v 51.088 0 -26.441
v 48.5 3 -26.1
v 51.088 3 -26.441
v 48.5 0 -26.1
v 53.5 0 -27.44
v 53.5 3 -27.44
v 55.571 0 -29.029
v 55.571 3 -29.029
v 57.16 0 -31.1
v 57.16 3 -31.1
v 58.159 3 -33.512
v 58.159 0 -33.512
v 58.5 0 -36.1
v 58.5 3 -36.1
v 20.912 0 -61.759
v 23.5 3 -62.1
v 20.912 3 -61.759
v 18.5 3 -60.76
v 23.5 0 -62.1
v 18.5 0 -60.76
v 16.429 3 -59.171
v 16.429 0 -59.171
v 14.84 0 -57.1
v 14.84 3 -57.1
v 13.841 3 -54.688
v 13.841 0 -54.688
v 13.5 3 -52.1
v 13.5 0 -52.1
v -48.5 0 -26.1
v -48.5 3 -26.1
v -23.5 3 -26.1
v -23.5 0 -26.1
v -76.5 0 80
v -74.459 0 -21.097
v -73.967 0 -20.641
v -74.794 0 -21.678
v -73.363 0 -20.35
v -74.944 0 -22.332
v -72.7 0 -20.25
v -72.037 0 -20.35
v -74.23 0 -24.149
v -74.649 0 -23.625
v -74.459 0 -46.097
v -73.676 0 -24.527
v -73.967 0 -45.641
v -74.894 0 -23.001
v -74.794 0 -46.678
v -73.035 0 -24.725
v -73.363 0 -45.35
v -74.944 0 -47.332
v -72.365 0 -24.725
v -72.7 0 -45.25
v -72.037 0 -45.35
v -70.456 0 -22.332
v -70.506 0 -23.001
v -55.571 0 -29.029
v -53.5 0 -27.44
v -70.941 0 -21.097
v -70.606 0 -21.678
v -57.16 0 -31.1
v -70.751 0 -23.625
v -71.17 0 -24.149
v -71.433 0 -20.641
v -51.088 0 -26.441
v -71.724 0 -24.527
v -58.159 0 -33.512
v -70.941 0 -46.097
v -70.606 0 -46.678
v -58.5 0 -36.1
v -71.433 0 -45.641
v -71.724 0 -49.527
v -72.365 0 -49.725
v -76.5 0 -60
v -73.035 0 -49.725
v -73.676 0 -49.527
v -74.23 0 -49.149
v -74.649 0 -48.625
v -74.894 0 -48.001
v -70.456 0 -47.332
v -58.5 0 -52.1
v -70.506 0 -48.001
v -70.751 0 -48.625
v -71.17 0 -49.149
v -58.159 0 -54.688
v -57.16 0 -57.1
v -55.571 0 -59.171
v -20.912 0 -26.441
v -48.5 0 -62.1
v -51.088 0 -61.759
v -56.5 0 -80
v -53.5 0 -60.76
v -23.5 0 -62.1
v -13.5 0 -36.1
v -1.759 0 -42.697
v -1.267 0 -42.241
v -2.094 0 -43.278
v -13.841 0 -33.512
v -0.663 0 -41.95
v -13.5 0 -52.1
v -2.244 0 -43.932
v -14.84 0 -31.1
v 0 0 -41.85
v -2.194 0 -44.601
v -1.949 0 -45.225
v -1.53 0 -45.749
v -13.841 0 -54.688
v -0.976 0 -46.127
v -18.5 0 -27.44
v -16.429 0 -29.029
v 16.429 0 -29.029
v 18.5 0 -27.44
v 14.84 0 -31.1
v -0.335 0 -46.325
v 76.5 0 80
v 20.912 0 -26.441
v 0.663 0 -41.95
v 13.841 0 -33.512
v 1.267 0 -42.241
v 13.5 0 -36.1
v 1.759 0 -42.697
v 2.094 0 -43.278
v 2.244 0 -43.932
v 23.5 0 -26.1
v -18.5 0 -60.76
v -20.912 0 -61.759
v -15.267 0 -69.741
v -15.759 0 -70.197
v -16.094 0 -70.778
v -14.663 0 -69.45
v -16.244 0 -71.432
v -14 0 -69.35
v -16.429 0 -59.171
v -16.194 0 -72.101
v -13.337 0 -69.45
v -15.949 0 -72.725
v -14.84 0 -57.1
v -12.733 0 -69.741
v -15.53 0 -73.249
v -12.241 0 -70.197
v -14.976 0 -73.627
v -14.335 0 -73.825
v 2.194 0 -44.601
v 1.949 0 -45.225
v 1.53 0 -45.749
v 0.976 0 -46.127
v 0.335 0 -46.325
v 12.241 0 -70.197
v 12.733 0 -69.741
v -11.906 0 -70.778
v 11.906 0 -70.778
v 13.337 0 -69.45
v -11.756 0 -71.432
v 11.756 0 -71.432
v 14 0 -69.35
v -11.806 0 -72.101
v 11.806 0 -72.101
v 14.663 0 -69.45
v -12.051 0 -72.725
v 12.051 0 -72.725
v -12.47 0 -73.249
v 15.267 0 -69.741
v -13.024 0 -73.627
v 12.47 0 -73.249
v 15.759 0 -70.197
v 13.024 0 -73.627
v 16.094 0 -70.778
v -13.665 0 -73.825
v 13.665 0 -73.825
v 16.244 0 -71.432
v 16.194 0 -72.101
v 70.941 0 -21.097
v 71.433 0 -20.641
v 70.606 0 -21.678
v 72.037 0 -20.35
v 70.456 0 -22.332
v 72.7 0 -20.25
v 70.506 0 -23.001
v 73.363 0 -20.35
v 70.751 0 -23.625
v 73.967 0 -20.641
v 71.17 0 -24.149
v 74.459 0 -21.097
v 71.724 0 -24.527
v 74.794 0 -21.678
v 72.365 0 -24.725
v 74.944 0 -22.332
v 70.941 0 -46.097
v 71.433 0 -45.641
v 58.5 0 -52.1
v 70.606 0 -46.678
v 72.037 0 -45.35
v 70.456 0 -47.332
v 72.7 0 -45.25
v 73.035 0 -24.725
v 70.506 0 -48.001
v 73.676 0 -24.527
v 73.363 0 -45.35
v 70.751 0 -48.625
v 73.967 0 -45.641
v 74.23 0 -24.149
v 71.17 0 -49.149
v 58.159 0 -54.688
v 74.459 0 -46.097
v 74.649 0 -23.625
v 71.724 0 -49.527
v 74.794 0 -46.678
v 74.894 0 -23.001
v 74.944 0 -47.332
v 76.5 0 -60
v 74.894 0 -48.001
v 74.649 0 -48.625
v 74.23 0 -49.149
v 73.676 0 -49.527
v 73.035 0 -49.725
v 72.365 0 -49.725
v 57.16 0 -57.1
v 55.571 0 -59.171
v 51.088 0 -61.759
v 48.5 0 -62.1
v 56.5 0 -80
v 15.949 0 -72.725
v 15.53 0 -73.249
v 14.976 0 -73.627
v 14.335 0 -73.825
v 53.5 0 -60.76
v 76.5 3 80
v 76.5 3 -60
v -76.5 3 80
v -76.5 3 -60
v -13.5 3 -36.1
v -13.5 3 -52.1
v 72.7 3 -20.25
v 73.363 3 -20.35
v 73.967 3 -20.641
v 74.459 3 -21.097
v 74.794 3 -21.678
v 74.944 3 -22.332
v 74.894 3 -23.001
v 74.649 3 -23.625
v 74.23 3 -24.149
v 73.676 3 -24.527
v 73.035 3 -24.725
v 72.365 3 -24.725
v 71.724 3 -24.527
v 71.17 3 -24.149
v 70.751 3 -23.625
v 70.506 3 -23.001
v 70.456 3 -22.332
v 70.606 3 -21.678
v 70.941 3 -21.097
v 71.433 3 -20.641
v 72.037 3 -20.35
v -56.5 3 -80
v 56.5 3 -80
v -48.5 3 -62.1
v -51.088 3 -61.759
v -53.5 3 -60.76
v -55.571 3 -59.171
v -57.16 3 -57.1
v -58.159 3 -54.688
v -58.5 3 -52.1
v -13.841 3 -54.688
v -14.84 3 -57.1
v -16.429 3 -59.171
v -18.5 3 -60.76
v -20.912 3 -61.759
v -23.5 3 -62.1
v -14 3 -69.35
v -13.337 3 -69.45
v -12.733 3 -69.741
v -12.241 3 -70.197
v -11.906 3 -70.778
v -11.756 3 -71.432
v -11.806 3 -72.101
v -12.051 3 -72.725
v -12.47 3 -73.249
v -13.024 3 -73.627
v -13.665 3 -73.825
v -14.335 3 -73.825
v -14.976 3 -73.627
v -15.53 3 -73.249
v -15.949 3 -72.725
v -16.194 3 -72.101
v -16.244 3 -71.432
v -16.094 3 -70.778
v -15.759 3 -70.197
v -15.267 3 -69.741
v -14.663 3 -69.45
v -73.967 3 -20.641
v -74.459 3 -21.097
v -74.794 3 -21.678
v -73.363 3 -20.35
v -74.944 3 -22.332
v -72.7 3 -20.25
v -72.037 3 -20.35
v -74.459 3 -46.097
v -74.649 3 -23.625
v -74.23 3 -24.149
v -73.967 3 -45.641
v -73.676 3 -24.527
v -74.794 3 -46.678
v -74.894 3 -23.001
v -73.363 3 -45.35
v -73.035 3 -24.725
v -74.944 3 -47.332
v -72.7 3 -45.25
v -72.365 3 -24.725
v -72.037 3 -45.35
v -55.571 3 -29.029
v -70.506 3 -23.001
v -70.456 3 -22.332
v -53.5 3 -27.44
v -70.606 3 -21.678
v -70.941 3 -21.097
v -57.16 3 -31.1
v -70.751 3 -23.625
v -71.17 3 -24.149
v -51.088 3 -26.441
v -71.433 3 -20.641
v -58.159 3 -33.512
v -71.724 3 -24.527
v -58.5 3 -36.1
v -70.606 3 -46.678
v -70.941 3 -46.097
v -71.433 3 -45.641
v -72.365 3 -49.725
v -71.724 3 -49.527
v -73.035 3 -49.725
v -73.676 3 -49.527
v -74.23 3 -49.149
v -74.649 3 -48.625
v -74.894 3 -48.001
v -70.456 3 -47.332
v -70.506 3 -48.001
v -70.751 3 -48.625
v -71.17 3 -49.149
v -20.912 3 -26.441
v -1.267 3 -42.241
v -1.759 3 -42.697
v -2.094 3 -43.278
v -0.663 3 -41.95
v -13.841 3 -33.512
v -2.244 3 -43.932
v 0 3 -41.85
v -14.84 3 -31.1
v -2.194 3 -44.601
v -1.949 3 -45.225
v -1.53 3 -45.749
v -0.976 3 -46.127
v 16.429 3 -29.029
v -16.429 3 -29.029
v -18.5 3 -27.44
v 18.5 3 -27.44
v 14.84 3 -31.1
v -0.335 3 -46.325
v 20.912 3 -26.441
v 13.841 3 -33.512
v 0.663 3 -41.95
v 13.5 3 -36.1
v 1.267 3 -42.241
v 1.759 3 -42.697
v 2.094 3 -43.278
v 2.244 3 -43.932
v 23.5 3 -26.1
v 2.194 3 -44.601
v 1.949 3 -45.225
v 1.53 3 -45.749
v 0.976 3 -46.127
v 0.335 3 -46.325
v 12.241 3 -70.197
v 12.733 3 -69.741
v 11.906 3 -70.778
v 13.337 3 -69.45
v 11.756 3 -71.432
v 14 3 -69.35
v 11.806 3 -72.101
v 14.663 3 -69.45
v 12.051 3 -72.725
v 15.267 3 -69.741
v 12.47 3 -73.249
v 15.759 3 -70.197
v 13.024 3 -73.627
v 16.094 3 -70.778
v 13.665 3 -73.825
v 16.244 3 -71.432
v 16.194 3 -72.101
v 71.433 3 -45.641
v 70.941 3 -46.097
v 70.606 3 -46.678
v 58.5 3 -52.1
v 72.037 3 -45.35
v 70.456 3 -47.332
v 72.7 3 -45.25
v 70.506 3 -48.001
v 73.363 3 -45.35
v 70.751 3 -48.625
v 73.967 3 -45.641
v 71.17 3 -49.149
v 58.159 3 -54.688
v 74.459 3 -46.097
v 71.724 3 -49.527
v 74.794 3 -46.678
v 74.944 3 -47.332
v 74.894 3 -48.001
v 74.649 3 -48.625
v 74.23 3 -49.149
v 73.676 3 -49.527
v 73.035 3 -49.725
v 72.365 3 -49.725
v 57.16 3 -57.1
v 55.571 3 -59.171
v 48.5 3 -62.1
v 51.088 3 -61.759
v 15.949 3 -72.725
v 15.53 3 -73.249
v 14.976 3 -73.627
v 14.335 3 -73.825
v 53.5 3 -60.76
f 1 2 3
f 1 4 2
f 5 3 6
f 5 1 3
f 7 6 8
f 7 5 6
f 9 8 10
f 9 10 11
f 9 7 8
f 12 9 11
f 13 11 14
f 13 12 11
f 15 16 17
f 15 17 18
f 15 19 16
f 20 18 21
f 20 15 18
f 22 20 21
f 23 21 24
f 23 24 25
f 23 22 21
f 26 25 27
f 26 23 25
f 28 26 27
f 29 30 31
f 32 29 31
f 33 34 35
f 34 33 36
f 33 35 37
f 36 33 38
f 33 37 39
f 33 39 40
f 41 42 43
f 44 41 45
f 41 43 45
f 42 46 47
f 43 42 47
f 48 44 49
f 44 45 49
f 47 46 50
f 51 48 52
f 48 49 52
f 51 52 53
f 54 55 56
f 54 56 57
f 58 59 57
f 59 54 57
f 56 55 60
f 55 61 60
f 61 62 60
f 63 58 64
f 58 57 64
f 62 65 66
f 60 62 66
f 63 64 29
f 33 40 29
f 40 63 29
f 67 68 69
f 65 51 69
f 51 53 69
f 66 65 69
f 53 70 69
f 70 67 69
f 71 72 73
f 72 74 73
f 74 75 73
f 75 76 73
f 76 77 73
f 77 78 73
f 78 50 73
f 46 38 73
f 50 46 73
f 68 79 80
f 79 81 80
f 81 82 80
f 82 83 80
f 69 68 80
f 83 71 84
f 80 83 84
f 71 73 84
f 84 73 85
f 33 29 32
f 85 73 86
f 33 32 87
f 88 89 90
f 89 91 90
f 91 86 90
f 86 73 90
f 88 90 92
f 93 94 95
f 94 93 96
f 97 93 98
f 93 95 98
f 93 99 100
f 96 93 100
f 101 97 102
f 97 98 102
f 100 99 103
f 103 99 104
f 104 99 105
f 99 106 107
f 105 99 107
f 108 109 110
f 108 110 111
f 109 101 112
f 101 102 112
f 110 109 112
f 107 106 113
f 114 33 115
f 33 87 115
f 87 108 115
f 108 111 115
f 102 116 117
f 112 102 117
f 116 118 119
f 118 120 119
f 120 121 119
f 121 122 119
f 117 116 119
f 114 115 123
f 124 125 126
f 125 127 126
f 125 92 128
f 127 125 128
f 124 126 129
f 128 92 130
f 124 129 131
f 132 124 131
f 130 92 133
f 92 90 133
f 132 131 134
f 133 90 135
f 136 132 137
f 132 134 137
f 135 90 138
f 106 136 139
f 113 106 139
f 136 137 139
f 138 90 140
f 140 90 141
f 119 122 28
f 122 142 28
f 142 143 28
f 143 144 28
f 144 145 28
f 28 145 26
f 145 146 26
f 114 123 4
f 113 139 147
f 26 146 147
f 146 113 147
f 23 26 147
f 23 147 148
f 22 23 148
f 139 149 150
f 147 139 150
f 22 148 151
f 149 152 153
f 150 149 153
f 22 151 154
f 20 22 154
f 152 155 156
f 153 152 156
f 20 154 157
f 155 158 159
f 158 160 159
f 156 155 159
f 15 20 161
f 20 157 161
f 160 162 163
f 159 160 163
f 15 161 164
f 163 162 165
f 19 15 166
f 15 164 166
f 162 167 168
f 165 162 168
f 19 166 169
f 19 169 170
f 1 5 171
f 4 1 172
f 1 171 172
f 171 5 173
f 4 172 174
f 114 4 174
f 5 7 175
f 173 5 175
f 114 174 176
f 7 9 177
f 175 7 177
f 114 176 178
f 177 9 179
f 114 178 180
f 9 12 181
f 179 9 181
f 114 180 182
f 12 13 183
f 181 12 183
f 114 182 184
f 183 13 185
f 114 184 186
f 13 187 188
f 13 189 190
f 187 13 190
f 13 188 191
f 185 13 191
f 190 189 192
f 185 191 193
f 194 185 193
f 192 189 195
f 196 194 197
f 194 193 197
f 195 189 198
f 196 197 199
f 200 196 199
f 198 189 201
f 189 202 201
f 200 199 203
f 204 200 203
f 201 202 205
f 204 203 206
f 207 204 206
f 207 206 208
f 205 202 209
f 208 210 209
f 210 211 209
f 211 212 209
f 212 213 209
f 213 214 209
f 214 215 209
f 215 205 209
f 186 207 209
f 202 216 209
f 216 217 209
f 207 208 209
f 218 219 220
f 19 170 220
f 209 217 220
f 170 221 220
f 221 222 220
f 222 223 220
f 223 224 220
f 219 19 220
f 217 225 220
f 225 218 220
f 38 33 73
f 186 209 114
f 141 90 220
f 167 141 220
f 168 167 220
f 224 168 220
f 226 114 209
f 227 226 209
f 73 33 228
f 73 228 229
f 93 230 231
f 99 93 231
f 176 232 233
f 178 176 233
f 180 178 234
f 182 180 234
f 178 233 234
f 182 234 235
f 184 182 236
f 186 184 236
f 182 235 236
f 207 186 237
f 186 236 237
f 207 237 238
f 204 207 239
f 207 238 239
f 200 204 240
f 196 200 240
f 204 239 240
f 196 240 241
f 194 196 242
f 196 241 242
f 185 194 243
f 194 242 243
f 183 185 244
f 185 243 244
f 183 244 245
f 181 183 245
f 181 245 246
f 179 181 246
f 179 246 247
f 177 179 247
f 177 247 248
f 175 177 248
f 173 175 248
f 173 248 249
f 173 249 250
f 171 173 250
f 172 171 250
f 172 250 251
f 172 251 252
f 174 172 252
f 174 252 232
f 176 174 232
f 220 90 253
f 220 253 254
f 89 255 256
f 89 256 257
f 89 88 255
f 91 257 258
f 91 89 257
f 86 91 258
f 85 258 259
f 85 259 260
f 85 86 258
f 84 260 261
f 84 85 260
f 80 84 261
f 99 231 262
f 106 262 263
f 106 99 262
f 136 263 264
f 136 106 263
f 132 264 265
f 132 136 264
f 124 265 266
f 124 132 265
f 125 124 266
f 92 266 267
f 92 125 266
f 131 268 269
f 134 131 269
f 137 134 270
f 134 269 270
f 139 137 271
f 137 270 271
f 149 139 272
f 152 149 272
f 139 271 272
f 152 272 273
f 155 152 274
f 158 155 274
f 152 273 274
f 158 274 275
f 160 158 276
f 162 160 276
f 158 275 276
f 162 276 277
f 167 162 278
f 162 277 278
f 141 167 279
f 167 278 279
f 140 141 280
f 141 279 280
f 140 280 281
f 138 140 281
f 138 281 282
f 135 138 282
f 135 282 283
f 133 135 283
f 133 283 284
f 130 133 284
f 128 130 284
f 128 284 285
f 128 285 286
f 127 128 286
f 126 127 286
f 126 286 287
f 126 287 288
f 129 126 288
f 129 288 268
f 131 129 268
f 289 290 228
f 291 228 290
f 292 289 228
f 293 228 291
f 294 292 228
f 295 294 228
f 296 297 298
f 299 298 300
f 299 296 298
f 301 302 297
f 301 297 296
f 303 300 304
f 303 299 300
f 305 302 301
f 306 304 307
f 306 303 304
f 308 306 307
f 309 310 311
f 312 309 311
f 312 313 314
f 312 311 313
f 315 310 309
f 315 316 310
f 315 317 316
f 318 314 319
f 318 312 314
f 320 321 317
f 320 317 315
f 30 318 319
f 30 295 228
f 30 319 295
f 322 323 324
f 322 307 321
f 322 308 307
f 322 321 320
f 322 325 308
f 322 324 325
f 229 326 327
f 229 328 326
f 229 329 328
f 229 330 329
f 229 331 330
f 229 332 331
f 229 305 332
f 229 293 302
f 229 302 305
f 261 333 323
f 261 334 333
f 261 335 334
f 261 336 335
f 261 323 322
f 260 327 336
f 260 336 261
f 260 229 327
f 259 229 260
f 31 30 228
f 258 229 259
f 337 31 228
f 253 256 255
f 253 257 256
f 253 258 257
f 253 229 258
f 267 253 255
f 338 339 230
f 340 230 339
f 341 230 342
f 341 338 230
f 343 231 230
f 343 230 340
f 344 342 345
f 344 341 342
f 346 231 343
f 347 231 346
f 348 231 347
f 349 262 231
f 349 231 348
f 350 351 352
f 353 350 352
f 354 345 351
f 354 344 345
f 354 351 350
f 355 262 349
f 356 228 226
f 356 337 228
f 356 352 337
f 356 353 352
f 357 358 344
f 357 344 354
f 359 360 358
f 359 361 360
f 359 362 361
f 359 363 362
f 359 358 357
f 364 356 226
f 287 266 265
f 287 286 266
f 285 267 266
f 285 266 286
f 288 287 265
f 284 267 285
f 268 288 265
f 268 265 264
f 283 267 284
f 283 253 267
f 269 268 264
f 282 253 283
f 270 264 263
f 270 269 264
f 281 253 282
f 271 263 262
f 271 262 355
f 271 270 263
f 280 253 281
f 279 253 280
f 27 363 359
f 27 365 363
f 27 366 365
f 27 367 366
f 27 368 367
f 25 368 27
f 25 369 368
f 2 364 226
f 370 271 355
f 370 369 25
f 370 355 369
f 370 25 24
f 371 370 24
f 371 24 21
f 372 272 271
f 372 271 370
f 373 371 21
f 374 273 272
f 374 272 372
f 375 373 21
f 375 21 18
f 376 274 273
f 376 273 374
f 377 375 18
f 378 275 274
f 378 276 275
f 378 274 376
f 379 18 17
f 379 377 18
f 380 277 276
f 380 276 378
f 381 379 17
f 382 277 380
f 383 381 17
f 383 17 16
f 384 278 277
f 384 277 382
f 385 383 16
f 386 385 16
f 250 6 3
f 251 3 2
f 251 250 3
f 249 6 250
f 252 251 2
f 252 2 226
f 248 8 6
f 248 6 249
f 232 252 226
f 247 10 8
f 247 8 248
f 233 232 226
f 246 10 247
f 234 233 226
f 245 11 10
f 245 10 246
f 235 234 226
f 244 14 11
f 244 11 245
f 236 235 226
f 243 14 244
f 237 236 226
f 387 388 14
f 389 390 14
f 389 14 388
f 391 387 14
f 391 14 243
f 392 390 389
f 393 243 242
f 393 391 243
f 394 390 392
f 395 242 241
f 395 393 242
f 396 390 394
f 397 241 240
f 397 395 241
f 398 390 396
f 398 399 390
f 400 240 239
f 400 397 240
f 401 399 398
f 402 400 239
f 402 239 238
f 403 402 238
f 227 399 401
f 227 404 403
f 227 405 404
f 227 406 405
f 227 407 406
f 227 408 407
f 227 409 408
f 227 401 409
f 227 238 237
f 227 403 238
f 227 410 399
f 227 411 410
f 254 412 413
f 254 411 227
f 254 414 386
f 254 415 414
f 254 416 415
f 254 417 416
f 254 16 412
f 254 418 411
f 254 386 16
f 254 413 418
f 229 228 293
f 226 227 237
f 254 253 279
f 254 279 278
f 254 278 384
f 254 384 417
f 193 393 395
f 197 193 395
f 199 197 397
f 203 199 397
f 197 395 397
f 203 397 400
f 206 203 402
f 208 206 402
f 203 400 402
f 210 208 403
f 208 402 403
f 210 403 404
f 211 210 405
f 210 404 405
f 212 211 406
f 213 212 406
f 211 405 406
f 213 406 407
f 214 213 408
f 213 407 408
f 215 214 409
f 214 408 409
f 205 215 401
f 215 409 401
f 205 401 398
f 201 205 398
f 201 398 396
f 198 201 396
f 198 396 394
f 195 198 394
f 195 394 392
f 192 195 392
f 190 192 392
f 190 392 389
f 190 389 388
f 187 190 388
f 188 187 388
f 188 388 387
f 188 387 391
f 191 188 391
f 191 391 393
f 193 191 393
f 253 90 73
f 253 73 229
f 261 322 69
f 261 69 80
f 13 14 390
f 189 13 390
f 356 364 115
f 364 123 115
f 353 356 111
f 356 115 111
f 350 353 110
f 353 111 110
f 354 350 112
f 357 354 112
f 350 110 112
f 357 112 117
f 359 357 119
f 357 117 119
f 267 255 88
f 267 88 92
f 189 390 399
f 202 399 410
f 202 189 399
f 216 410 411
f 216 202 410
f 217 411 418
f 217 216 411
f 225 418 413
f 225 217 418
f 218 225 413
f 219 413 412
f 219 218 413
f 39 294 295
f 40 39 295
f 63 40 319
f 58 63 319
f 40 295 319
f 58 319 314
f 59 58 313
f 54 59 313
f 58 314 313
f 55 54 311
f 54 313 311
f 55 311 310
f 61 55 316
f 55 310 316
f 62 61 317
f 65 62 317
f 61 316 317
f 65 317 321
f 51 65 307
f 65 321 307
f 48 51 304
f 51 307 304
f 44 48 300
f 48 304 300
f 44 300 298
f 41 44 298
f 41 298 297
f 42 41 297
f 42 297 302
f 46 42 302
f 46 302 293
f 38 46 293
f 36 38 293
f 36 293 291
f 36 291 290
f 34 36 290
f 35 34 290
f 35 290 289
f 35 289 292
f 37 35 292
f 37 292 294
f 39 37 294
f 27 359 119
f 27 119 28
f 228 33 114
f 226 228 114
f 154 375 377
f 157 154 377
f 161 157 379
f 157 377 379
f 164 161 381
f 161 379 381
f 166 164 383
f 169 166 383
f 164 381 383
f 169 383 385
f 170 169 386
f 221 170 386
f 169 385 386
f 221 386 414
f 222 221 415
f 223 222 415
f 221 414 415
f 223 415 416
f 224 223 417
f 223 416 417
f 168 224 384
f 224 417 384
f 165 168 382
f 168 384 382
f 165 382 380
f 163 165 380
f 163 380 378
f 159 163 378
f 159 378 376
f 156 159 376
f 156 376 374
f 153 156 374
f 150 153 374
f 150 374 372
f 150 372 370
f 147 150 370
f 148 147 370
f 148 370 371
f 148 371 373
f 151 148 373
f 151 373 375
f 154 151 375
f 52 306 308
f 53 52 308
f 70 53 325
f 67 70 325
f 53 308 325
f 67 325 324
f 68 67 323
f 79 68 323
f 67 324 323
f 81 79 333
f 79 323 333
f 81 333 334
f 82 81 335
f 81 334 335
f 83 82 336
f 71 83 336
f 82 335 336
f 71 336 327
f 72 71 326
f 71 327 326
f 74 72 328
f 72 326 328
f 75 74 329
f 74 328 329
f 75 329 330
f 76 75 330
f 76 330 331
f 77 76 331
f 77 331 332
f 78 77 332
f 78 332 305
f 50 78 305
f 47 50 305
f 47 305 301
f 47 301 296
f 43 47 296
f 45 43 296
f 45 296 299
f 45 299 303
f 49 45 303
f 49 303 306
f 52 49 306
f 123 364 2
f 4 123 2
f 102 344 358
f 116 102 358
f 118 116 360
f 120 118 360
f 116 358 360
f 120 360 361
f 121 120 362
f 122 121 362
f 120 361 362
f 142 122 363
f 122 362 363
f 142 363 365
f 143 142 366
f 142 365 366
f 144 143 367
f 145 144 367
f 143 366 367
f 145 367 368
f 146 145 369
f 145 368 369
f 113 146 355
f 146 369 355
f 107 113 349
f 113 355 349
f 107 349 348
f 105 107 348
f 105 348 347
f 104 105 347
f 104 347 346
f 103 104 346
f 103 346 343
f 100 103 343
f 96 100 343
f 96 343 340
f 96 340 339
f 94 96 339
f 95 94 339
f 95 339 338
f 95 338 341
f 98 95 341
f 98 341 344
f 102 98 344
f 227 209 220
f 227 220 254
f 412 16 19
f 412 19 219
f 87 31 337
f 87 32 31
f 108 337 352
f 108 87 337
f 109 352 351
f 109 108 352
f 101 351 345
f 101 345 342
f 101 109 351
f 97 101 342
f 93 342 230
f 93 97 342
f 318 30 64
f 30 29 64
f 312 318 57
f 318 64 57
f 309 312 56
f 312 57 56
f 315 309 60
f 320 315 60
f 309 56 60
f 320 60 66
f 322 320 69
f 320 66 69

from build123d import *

# Parameters (mm, degrees)
SKETCH_1_W          = 153
SKETCH_1_H          = 160
EXTRUDE_1_DEPTH     = 3
SKETCH_2_R          = 2.25
CUT_EXTRUDE_1_DEPTH = 5
SKETCH_3_W          = 45
SKETCH_3_H          = 36
CUT_EXTRUDE_2_DEPTH = 5
FILLET_1_R          = 10
CHAMFER_1_SIZE      = 20


with BuildPart() as part:
    # 草图1 → 凸台-拉伸1 (new body)
    with BuildSketch(Plane(origin=(0, 0, 0), x_dir=(1, 0, 0), z_dir=(0, 1, 0))):
        Rectangle(SKETCH_1_W, SKETCH_1_H)
    extrude(amount=EXTRUDE_1_DEPTH)

    # 草图2 → 切除-拉伸1 (cut)
    with BuildSketch(Plane(origin=(0, 3, 0), x_dir=(1, 0, 0), z_dir=(0, 1, 0))):
        with Locations(Location((72.7, 47.5, 0), (0, 0, 270))):
            Circle(SKETCH_2_R)
        with Locations(Location((-72.7, 47.5, 0), (0, 0, 270))):
            Circle(SKETCH_2_R)
        with Locations(Location((72.7, 22.5, 0), (0, 0, 270))):
            Circle(SKETCH_2_R)
        with Locations(Location((-72.7, 22.5, 0), (0, 0, 270))):
            Circle(SKETCH_2_R)
        with Locations(Location((-14, 71.6, 0), (0, 0, 270))):
            Circle(SKETCH_2_R)
        with Locations(Location((14, 71.6, 0), (0, 0, 270))):
            Circle(SKETCH_2_R)
        with Locations(Location((0, 44.1, 0), (0, 0, 270))):
            Circle(SKETCH_2_R)
    extrude(amount=-CUT_EXTRUDE_1_DEPTH, mode=Mode.SUBTRACT)

    # 草图3 → 切除-拉伸2 (cut)
    with BuildSketch(Plane(origin=(0, 3, 0), x_dir=(1, 0, 0), z_dir=(0, 1, 0))):
        with Locations((36, 44.1)):
            Rectangle(SKETCH_3_W, SKETCH_3_H)
        with Locations((-36, 44.1)):
            Rectangle(SKETCH_3_W, SKETCH_3_H)
    extrude(amount=-CUT_EXTRUDE_2_DEPTH, mode=Mode.SUBTRACT)

    # 圆角1
    fillet_1_edges = [part.edges().sort_by_distance(p)[0] for p in [
        (58.5, 1.5, -62.1),
        (58.5, 1.5, -26.1),
        (13.5, 1.5, -26.1),
        (13.5, 1.5, -62.1),
        (-58.5, 1.5, -62.1),
        (-13.5, 1.5, -62.1),
        (-13.5, 1.5, -26.1),
        (-58.5, 1.5, -26.1),
    ]]
    fillet(fillet_1_edges, radius=FILLET_1_R)

    # 倒角1
    chamfer_1_edges = [part.edges().sort_by_distance(p)[0] for p in [
        (-76.5, 1.5, -80),
        (76.5, 1.5, -80),
    ]]
    chamfer(chamfer_1_edges, length=CHAMFER_1_SIZE)


solid = part.part
